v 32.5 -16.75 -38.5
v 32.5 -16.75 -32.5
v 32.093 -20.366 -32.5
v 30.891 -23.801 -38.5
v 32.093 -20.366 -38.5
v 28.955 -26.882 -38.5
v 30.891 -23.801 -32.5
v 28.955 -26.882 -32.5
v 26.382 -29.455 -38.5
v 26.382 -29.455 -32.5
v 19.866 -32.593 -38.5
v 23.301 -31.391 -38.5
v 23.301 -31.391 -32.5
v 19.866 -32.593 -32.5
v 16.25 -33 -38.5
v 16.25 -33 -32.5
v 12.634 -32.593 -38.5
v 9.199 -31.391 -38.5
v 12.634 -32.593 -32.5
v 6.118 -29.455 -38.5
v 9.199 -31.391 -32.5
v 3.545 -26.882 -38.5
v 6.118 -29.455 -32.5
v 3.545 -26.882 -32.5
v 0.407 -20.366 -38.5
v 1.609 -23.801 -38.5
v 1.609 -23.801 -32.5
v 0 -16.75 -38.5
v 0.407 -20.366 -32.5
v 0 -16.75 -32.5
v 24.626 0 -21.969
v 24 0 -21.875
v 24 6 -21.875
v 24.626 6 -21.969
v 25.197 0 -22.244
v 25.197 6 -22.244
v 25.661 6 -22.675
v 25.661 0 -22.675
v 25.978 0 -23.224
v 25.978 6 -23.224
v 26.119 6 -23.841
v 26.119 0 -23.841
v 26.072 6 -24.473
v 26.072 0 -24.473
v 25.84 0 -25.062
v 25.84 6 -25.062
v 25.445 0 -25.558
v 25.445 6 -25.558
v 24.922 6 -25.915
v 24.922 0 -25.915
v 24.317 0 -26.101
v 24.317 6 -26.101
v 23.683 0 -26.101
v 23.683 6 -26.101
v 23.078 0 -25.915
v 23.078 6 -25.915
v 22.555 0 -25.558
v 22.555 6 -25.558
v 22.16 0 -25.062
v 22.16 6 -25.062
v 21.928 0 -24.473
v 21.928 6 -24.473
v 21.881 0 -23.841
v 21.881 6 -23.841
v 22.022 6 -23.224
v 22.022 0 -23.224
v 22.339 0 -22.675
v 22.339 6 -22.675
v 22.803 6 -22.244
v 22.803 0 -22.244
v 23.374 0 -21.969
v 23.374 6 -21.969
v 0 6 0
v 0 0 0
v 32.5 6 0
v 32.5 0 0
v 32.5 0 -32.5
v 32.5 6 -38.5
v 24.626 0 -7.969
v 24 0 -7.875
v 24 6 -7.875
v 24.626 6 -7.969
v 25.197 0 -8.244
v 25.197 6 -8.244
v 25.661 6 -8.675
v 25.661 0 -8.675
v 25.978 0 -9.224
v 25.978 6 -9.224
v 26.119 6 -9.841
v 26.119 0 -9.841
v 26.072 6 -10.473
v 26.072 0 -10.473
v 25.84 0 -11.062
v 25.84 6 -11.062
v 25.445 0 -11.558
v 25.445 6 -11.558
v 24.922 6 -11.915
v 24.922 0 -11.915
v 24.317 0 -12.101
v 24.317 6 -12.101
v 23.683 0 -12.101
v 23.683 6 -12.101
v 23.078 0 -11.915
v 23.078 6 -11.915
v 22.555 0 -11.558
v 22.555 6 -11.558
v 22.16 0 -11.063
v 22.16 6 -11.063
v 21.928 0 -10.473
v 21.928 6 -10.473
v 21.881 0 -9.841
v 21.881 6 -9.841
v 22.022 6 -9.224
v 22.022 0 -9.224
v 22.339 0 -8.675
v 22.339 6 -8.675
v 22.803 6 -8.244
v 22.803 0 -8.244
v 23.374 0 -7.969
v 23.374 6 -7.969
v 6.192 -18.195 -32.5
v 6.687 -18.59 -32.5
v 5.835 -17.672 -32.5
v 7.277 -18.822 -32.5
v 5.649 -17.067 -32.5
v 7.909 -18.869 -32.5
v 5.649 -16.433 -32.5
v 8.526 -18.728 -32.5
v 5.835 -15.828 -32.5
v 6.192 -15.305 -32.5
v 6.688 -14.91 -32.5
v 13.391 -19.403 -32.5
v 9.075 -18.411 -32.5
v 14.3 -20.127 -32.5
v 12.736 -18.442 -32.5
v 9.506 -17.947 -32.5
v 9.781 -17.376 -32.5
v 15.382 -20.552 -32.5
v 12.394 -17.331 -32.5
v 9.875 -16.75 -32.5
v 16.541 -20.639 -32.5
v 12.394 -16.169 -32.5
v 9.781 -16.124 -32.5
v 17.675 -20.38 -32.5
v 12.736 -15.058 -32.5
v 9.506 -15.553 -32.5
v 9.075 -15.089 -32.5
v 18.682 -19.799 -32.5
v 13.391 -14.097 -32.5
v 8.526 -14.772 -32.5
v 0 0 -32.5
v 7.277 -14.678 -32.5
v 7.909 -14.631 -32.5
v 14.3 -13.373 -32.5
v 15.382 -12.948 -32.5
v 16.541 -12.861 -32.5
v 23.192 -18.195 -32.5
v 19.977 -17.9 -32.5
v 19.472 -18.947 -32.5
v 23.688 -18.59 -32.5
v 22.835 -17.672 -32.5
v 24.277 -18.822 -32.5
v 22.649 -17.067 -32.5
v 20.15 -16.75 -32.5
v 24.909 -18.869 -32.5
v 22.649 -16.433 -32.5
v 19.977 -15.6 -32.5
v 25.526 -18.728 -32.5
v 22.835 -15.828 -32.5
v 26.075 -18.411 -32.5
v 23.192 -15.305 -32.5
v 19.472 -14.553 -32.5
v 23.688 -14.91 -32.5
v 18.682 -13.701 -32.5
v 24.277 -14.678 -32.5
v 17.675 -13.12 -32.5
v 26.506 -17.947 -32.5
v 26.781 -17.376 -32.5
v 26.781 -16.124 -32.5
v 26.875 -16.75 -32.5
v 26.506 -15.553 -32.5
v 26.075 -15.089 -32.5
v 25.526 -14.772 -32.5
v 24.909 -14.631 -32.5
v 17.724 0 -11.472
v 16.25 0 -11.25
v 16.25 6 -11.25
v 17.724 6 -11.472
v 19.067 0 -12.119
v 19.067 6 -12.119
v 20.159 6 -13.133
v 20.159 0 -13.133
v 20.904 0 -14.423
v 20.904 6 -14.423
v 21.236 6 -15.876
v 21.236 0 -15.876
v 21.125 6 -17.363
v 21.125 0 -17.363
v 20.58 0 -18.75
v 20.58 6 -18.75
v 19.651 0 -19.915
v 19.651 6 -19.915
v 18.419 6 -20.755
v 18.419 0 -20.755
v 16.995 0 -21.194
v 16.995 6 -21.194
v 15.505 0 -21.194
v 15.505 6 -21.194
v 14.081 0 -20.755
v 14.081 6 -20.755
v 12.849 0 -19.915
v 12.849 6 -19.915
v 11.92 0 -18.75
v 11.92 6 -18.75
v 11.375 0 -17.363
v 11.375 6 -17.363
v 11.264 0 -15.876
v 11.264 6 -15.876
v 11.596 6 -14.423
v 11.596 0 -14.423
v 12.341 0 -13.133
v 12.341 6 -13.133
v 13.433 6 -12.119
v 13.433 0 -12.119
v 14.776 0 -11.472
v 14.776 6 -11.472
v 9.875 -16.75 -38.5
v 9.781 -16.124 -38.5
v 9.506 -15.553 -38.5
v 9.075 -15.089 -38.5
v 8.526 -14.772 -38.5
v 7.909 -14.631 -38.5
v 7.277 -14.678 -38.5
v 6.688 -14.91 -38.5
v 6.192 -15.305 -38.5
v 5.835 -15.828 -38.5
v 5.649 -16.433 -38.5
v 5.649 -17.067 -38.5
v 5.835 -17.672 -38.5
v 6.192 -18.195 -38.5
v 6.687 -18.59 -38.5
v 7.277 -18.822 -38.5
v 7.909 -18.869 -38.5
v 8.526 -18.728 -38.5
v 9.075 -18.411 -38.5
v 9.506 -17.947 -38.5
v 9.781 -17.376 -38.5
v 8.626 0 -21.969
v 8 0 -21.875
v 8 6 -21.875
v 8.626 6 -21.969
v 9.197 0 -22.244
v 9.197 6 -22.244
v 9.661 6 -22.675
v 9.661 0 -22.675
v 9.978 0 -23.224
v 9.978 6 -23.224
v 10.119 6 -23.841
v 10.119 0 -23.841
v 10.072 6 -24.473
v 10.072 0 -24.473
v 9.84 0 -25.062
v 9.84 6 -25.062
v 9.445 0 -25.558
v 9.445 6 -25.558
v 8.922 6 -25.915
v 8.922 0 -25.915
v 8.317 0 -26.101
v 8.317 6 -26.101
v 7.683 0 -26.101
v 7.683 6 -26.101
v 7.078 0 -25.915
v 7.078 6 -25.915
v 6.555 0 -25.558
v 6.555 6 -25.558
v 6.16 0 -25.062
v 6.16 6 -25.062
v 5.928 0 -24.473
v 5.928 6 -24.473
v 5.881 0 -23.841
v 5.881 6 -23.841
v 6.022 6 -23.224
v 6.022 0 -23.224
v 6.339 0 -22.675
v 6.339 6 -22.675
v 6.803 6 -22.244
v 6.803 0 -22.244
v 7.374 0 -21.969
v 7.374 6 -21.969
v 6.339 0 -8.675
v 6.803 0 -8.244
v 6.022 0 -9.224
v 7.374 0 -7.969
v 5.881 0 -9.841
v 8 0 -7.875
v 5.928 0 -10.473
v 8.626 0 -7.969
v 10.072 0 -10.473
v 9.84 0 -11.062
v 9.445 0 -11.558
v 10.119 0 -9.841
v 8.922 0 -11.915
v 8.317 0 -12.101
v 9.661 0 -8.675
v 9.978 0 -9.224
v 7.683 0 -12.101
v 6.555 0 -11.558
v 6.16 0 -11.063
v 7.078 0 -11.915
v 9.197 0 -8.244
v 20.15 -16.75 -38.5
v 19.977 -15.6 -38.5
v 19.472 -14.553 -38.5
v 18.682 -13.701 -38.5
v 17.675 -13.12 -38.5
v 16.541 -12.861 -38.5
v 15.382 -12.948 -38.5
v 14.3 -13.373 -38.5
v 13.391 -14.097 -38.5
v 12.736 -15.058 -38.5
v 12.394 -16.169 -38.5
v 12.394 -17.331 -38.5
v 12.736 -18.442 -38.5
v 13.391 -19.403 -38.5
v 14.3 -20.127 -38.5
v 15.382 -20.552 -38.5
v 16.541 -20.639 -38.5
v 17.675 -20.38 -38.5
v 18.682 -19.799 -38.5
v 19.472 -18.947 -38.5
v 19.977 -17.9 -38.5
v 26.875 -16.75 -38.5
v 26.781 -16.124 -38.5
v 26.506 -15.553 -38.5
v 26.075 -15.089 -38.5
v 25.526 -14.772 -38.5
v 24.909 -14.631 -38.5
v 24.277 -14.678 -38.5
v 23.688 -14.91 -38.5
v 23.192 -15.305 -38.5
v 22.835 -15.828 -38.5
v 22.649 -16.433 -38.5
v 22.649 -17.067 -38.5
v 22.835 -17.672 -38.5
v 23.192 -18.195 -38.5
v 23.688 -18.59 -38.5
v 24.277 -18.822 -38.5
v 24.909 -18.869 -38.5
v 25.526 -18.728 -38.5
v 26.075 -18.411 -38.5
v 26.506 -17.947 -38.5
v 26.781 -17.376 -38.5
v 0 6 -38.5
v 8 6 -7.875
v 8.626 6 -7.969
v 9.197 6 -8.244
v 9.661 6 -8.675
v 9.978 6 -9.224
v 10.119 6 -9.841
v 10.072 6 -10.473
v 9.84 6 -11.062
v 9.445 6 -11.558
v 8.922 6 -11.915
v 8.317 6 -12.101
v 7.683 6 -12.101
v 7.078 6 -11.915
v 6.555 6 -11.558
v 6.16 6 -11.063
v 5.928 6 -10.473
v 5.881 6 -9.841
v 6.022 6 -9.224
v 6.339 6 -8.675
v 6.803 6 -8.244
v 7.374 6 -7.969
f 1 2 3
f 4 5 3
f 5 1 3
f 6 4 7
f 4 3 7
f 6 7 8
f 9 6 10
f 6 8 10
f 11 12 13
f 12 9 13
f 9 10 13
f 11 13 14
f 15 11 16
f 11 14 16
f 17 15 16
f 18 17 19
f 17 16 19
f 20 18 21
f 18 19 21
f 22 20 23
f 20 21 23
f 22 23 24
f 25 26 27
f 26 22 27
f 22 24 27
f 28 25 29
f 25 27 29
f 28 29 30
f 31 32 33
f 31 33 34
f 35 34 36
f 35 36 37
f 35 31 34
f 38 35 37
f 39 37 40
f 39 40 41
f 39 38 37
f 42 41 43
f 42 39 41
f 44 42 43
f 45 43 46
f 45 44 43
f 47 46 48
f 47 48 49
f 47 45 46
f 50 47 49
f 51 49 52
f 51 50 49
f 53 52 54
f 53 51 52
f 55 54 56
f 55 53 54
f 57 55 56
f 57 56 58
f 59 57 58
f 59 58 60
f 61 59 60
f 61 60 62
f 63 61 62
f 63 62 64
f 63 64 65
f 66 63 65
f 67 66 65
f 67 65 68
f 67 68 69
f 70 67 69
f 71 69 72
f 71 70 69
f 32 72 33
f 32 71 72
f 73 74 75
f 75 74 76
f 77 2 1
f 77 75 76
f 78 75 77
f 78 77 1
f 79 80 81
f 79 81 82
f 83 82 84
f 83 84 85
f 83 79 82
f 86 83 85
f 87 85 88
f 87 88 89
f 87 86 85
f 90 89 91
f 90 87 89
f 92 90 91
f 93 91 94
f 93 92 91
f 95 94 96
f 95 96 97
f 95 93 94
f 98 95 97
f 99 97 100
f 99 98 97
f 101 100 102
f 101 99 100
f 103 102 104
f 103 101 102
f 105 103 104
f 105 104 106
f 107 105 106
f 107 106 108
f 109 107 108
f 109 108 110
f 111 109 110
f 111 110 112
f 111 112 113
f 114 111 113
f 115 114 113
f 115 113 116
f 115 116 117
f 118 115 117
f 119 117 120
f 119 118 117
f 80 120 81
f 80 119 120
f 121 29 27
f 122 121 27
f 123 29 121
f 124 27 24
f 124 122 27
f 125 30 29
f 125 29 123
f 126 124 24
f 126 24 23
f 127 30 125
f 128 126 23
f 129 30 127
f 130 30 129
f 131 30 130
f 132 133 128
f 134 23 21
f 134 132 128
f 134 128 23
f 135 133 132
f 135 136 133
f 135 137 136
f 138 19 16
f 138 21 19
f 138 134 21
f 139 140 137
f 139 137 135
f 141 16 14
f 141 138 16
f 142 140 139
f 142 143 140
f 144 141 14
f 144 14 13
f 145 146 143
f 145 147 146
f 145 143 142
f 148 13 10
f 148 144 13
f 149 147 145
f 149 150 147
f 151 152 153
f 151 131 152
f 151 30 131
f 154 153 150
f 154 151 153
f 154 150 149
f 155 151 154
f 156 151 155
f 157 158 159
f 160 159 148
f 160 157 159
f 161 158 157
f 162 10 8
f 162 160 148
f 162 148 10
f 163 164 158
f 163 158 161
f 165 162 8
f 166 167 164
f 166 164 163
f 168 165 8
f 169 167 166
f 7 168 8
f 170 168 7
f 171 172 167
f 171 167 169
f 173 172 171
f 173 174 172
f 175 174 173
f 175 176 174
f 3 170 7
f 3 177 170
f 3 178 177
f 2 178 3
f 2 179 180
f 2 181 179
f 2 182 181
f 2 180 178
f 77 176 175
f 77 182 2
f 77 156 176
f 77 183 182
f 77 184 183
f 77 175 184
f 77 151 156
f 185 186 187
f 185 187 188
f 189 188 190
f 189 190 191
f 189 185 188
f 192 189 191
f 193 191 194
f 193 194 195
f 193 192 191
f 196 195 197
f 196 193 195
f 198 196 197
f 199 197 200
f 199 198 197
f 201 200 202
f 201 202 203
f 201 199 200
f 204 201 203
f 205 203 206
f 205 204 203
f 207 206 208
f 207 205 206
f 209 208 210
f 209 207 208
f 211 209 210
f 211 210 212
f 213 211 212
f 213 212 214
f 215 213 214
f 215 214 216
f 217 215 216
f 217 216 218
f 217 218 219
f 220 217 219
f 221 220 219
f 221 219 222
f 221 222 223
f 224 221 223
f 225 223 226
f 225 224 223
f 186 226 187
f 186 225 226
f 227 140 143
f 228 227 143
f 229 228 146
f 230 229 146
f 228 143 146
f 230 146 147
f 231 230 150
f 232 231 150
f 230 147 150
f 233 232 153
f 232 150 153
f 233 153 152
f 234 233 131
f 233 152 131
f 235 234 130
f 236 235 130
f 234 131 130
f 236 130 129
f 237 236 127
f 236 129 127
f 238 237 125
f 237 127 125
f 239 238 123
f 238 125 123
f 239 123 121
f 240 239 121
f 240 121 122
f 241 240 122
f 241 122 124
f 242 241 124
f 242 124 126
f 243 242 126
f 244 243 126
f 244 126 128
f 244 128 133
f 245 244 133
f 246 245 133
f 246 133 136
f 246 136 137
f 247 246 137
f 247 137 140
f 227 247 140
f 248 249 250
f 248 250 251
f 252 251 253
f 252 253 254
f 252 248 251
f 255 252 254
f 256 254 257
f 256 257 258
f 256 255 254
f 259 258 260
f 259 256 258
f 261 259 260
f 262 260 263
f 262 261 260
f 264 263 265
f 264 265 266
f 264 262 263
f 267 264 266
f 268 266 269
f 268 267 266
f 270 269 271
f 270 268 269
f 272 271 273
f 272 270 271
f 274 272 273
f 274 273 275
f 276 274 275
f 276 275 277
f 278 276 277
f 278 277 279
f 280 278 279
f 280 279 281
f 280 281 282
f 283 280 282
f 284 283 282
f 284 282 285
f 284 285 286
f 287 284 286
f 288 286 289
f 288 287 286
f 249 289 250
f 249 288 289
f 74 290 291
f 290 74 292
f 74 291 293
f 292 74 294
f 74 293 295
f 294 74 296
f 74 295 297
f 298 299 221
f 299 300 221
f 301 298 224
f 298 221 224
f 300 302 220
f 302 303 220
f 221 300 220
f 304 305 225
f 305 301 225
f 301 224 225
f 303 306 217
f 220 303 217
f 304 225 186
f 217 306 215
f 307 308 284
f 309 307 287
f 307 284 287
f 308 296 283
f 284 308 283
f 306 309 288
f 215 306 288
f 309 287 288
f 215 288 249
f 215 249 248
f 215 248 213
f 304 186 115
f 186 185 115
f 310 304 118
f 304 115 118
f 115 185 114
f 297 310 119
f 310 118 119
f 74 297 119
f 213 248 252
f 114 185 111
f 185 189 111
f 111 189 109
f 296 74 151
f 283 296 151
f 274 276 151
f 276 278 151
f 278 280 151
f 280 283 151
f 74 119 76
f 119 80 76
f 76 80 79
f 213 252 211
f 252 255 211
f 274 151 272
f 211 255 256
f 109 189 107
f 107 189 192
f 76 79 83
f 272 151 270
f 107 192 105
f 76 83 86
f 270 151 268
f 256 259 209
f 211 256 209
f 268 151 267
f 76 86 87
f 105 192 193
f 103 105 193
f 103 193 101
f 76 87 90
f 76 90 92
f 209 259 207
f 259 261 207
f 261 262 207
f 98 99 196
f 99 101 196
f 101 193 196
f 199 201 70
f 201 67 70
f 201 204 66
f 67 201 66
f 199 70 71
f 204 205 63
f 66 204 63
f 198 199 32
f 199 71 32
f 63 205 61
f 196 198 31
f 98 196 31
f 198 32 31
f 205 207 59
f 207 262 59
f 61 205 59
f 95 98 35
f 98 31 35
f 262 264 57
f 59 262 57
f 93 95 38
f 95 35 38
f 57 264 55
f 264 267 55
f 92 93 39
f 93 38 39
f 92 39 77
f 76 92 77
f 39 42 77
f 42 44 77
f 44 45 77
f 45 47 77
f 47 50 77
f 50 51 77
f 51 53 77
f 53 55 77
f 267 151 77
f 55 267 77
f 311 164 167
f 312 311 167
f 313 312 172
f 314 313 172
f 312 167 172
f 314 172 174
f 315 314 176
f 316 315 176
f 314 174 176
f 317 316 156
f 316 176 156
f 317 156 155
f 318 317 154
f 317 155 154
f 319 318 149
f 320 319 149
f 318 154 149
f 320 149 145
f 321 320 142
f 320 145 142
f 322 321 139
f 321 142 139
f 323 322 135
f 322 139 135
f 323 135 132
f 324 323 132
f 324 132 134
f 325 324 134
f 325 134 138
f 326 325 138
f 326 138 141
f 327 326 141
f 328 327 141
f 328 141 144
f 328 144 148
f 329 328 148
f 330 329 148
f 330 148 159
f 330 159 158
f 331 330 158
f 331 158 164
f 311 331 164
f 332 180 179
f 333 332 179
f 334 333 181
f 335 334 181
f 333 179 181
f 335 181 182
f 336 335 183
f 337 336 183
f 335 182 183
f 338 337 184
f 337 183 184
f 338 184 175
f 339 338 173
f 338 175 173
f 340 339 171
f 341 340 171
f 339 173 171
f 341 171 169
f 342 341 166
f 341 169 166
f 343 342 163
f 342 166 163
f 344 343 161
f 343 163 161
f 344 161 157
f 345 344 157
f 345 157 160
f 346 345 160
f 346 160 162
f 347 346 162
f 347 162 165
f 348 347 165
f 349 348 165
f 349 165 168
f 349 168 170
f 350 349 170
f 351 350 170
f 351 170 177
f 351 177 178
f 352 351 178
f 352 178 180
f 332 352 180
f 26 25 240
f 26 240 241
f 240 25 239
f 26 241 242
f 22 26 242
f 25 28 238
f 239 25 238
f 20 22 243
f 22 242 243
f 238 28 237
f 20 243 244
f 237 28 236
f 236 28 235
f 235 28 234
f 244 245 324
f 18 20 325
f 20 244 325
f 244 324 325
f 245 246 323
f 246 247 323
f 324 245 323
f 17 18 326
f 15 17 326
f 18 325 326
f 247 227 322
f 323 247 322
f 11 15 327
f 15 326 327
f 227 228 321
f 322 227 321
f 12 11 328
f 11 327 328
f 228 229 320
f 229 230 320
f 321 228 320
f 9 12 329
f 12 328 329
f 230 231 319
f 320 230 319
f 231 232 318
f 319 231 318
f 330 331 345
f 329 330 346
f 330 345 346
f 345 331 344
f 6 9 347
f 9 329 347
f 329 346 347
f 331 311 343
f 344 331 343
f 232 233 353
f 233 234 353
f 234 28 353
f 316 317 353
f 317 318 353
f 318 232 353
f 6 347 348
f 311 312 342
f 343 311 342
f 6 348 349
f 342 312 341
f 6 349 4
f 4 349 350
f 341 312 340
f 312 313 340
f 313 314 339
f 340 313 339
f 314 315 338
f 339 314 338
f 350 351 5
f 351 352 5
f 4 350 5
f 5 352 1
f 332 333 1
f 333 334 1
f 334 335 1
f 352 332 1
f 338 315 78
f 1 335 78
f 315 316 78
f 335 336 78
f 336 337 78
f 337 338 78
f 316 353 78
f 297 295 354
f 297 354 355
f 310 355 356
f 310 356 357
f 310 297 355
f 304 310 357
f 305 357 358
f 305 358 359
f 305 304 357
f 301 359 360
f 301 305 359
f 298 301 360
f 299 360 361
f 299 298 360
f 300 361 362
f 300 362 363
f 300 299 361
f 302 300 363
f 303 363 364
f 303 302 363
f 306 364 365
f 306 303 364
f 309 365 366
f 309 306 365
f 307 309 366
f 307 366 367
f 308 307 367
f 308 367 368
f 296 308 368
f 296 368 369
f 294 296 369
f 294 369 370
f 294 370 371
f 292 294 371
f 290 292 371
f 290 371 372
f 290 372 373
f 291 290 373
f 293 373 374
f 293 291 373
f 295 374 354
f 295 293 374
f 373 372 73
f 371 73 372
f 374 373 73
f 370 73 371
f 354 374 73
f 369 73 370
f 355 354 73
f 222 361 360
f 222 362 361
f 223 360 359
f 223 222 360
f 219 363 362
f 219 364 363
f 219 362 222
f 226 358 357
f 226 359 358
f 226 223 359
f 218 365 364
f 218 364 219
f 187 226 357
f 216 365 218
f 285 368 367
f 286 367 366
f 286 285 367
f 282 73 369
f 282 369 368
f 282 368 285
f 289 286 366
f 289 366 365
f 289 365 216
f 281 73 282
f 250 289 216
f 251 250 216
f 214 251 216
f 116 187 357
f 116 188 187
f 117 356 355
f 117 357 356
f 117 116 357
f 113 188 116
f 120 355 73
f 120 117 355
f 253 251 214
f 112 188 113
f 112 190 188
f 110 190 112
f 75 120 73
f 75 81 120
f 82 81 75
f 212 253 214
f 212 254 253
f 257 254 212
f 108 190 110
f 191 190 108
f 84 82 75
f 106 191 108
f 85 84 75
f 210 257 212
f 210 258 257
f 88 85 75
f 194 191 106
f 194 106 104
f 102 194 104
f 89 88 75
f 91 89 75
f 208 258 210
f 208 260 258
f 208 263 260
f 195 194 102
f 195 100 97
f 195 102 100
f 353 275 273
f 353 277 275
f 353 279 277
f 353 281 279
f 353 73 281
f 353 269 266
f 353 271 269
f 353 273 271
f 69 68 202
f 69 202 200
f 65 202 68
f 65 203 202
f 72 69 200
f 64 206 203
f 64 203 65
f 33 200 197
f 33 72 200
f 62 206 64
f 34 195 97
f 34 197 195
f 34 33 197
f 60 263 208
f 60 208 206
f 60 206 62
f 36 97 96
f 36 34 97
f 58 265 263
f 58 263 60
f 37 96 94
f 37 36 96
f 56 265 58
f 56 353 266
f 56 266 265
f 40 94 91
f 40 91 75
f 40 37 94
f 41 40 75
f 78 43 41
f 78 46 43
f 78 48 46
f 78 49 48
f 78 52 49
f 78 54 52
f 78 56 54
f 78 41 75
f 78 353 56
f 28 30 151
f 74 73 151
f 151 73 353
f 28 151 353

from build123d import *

# Parameters (mm, degrees)
SKETCH1_W           = 32.5
SKETCH1_H           = 32.5
SKETCH1_R           = 2.125
SKETCH1_R_2         = 5
BOSS_EXTRUDE1_DEPTH = 6
SKETCH2_W           = 32.5
SKETCH2_H           = 6
BOSS_EXTRUDE2_DEPTH = 39
CUT_EXTRUDE1_DEPTH  = 39
SKETCH4_R           = 3.9
SKETCH4_R_2         = 2.125
CUT_EXTRUDE2_DEPTH  = 39


with BuildPart() as part:
    # Sketch1 → Boss-Extrude1 (new body)
    with BuildSketch(Plane(origin=(0, 0, 0), x_dir=(1, 0, 0), z_dir=(0, 1, 0))):
        with Locations((16.25, 16.25)):
            Rectangle(SKETCH1_W, SKETCH1_H)
        with Locations(Location((24, 10, 0), (0, 0, 270))):
            Circle(SKETCH1_R, mode=Mode.SUBTRACT)
        with Locations(Location((24, 24, 0), (0, 0, 270))):
            Circle(SKETCH1_R, mode=Mode.SUBTRACT)
        with Locations(Location((8, 24, 0), (0, 0, 270))):
            Circle(SKETCH1_R, mode=Mode.SUBTRACT)
        with Locations(Location((8, 10, 0), (0, 0, 270))):
            Circle(SKETCH1_R, mode=Mode.SUBTRACT)
        with Locations(Location((16.25, 16.25, 0), (0, 0, 270))):
            Circle(SKETCH1_R_2, mode=Mode.SUBTRACT)
    extrude(amount=BOSS_EXTRUDE1_DEPTH)

    # Sketch2 → Boss-Extrude2 (add)
    with BuildSketch(Plane(origin=(0, 6, 0), x_dir=(1, 0, 0), z_dir=(0, 1, 0))):
        with Locations((16.25, 35.5)):
            Rectangle(SKETCH2_W, SKETCH2_H)
    extrude(amount=-BOSS_EXTRUDE2_DEPTH)

    # Sketch3 → Cut-Extrude1 (cut)
    with BuildSketch(Plane.XY.offset(-32.5)):
        with BuildLine():
            Line((16.25, -33), (32.5, -33))
            Line((32.5, -33), (32.5, -16.75))
            ThreePointArc((32.5, -16.75), (27.740485194, -28.240485194), (16.25, -33))
        make_face()
        with BuildLine():
            Line((0, -33), (16.25, -33))
            ThreePointArc((16.25, -33), (4.759514806, -28.240485194), (0, -16.75))
            Line((0, -16.75), (0, -33))
        make_face()
    extrude(amount=-CUT_EXTRUDE1_DEPTH, mode=Mode.SUBTRACT)

    # Sketch4 → Cut-Extrude2 (cut)
    with BuildSketch(Plane.XY.offset(-32.5)):
        with Locations((16.25, -16.75)):
            Circle(SKETCH4_R)
        with Locations((7.75, -16.75)):
            Circle(SKETCH4_R_2)
        with Locations((24.75, -16.75)):
            Circle(SKETCH4_R_2)
    extrude(amount=-CUT_EXTRUDE2_DEPTH, mode=Mode.SUBTRACT)


solid = part.part
